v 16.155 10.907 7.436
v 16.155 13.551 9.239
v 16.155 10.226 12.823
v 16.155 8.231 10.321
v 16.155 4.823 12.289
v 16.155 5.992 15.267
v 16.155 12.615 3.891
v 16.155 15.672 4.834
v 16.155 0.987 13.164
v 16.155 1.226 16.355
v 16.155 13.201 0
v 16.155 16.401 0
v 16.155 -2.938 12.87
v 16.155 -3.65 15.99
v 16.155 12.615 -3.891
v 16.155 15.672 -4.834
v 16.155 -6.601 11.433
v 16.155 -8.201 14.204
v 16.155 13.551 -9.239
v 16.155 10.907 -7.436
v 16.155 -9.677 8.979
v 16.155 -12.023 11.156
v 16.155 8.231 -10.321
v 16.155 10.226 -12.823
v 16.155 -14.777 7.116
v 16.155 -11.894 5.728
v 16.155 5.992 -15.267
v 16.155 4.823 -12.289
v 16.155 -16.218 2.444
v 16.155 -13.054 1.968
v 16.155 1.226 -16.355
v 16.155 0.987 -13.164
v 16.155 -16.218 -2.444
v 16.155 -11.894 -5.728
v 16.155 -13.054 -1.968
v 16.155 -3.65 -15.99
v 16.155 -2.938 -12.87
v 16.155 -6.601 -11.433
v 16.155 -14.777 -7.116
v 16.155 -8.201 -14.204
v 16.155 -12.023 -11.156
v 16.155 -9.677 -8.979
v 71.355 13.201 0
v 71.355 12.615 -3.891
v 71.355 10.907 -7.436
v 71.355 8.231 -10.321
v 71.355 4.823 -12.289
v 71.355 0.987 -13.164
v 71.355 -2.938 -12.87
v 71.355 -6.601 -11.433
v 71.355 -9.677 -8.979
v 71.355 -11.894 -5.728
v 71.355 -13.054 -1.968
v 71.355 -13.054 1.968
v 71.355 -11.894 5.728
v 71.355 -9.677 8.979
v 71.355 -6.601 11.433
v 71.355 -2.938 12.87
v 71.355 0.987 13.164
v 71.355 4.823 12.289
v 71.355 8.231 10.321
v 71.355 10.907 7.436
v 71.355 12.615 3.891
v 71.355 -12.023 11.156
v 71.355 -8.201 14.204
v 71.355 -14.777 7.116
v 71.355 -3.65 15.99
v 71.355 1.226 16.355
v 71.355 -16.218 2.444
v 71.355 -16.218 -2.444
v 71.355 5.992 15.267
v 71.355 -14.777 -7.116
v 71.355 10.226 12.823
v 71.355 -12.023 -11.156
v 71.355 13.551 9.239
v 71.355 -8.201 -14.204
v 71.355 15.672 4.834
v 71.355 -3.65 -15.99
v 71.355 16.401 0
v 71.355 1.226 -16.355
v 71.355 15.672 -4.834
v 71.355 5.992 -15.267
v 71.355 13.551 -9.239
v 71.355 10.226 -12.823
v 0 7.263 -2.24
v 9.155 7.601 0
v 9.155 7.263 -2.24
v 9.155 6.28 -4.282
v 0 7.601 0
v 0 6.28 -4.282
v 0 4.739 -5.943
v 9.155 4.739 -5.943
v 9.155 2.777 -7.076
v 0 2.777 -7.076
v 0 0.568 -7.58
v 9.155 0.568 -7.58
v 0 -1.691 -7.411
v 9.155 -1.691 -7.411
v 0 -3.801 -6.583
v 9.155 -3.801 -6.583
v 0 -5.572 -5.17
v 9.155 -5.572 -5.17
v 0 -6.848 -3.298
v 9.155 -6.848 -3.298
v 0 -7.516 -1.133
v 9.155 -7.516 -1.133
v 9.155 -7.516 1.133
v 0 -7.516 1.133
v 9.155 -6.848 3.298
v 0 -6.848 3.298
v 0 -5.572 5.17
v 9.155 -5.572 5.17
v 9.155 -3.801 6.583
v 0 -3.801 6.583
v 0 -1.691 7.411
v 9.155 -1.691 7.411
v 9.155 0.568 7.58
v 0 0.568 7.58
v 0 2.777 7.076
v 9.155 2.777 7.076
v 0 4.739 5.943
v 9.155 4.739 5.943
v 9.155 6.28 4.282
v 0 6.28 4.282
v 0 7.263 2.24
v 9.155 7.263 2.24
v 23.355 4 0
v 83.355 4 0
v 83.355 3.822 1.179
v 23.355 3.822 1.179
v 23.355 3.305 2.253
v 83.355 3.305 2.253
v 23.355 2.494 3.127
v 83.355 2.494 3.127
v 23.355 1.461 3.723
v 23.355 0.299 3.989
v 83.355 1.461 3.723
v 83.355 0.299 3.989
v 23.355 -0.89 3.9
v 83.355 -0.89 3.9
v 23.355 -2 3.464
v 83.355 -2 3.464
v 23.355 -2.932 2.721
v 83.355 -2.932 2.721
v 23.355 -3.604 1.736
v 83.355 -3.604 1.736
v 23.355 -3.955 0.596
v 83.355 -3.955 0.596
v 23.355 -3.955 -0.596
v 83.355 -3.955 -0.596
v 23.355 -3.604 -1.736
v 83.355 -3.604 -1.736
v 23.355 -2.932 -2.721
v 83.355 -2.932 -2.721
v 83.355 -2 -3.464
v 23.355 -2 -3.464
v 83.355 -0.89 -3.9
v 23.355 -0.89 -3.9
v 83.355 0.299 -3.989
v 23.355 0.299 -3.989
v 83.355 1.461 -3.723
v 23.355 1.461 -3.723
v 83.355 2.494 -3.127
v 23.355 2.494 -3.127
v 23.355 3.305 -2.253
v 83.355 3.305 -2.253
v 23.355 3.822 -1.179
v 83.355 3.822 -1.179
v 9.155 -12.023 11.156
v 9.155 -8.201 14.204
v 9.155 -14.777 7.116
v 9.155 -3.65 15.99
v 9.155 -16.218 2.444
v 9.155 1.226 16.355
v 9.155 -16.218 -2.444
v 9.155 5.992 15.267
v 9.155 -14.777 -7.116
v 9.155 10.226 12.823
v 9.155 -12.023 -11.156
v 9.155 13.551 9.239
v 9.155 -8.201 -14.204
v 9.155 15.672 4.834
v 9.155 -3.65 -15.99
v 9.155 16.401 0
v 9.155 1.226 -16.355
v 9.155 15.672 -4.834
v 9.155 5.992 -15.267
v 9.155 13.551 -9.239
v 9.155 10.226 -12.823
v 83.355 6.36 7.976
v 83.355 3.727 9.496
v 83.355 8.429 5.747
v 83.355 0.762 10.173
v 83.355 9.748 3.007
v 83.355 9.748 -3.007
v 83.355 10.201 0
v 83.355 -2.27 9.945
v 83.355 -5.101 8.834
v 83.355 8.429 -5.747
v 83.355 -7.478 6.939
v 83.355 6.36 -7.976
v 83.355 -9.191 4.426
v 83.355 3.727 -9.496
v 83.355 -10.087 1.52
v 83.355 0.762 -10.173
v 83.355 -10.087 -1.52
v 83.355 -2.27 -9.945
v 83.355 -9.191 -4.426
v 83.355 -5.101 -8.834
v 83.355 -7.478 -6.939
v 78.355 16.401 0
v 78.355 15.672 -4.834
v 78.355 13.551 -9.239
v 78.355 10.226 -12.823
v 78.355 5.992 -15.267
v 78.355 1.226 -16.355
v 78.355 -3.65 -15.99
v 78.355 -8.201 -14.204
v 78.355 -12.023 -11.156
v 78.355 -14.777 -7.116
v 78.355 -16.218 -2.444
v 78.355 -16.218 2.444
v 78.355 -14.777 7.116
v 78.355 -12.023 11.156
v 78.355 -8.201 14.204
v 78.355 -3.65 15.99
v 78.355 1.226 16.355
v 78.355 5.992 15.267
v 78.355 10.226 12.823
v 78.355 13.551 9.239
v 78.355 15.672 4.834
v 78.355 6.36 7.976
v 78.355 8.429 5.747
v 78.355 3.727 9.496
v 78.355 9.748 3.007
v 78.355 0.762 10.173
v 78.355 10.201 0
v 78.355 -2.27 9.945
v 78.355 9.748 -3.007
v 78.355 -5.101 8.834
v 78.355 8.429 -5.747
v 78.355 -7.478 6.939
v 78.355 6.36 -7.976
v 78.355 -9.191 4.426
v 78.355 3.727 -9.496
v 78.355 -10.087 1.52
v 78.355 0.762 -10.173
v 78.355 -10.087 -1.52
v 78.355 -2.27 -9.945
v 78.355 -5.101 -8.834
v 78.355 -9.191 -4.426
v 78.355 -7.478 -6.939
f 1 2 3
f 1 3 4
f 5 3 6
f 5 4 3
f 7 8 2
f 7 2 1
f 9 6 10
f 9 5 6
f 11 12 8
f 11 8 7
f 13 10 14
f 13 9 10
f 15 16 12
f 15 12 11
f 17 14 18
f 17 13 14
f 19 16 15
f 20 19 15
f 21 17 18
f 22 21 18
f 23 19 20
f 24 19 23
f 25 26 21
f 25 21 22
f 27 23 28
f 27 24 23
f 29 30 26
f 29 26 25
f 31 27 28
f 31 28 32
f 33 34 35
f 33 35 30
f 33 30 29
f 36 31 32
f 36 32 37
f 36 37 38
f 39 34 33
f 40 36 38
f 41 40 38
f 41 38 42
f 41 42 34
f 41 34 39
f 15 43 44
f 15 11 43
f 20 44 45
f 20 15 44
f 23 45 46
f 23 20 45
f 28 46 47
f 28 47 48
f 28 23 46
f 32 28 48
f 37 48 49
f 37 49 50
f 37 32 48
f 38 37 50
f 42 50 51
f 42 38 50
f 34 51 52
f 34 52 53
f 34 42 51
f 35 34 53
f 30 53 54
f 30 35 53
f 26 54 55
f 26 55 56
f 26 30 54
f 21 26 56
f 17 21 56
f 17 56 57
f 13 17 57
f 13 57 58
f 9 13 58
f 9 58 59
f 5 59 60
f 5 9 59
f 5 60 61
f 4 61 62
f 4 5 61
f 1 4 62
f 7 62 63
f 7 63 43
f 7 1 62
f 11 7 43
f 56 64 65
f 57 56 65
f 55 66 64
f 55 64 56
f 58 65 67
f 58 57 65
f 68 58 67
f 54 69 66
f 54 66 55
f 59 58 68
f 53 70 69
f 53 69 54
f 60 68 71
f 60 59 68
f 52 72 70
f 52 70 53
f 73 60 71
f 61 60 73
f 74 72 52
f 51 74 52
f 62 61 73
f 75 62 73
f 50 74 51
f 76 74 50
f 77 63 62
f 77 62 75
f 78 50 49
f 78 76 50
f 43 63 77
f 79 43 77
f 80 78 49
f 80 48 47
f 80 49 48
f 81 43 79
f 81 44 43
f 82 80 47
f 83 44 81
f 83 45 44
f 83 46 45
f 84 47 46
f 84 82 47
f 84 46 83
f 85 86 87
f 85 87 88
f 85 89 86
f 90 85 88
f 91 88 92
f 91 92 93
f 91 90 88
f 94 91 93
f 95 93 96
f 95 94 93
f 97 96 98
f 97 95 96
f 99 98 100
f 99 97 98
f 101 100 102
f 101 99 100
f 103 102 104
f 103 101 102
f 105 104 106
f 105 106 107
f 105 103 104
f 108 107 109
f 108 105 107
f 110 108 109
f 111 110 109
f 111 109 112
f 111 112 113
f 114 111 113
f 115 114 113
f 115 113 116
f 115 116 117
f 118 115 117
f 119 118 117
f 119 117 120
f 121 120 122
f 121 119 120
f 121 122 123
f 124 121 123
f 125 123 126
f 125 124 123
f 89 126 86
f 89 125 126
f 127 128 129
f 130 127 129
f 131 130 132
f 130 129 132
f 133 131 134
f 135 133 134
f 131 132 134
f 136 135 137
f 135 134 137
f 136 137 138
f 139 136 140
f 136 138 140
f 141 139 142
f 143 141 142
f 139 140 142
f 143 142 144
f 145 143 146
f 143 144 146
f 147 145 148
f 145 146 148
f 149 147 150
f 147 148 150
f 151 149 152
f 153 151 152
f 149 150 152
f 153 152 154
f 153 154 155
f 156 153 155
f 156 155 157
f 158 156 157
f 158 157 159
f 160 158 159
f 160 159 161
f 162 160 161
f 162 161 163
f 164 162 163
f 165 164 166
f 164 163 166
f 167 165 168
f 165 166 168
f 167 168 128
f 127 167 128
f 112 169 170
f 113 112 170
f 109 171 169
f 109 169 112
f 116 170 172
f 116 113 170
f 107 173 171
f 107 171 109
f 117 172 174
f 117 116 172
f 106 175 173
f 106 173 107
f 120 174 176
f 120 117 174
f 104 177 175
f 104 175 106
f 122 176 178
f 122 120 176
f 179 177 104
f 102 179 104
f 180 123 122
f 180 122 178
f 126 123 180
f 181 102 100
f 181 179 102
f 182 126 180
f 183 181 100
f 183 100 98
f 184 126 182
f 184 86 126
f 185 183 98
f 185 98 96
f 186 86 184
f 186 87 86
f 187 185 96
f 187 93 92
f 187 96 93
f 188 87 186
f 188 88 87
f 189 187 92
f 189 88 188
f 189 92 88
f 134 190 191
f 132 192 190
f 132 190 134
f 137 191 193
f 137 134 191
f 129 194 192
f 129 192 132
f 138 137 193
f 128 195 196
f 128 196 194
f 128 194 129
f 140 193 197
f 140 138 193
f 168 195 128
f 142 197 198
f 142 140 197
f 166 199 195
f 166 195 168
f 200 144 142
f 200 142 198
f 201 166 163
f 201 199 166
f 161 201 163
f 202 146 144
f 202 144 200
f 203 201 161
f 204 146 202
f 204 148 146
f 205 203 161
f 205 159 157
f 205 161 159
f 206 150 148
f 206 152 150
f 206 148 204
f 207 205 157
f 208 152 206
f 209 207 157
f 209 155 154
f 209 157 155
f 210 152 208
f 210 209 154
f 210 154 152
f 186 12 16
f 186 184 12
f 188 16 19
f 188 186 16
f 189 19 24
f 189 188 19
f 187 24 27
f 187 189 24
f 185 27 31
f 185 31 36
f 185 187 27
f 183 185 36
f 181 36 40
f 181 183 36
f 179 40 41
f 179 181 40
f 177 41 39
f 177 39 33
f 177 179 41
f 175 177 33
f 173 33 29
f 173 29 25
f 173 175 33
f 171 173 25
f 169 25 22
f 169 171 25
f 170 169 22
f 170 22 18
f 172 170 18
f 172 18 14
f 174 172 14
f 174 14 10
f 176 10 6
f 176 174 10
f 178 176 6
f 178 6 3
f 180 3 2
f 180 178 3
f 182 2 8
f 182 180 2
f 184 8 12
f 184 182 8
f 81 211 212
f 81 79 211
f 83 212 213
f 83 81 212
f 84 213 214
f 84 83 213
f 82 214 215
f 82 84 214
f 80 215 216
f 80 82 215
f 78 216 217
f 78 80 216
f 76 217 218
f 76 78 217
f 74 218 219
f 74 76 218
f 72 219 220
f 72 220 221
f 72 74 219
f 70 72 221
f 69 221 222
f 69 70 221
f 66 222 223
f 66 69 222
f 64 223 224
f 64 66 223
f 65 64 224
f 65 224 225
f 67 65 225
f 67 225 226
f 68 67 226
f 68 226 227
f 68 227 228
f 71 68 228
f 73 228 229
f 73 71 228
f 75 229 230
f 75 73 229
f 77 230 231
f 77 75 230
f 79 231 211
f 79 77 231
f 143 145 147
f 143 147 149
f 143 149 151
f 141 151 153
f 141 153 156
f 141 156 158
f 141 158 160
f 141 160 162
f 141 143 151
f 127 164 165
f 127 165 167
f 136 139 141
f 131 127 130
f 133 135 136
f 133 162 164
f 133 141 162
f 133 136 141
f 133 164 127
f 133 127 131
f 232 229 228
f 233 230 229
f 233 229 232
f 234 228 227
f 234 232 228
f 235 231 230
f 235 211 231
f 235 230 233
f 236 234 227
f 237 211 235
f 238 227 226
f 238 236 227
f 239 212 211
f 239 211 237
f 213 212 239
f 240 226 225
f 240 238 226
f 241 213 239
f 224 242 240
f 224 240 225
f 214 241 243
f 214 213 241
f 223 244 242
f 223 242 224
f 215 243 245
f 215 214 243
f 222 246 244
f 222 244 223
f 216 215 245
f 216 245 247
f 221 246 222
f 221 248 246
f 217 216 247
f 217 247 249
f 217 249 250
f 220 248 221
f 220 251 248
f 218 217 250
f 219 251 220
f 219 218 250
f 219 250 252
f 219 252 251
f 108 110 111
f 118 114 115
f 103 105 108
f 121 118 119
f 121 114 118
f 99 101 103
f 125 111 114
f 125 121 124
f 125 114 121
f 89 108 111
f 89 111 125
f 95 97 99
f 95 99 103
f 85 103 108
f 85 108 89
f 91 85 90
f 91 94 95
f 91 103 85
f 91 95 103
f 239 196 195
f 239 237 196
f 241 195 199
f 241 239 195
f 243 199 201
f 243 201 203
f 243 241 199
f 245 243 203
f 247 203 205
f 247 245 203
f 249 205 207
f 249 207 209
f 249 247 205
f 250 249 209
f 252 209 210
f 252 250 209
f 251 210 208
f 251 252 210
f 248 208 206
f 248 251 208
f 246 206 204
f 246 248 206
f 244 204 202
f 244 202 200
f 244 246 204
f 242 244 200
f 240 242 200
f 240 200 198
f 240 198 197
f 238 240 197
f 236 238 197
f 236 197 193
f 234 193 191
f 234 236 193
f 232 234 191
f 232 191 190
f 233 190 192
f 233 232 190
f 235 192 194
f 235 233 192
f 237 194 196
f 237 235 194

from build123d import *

# Parameters (mm, degrees)
F2_R     = 4
F3_DEPTH = 60


with BuildPart() as f1:
    # F0 (on Top) → F1 (revolve)
    with BuildSketch(Plane.XY):
        Polygon((0, 7.601157), (0, 0), (83.355051, 0), (83.355051, 10.201156), (78.355052, 10.201156), (78.355052, 16.401156), (71.355052, 16.401156), (71.355052, 13.201156), (16.155056, 13.201156), (16.155056, 16.401156), (9.155056, 16.401156), (9.155056, 7.601157), align=None)
    revolve(axis=Axis((41.677526, 0, 0), (-1, 0, 0)))

    # F2 (on face) → F3 (cut)
    with BuildSketch(Plane.YZ.offset(83.355051)):
        Circle(F2_R)
    extrude(amount=-F3_DEPTH, mode=Mode.SUBTRACT)


solid = f1.part
